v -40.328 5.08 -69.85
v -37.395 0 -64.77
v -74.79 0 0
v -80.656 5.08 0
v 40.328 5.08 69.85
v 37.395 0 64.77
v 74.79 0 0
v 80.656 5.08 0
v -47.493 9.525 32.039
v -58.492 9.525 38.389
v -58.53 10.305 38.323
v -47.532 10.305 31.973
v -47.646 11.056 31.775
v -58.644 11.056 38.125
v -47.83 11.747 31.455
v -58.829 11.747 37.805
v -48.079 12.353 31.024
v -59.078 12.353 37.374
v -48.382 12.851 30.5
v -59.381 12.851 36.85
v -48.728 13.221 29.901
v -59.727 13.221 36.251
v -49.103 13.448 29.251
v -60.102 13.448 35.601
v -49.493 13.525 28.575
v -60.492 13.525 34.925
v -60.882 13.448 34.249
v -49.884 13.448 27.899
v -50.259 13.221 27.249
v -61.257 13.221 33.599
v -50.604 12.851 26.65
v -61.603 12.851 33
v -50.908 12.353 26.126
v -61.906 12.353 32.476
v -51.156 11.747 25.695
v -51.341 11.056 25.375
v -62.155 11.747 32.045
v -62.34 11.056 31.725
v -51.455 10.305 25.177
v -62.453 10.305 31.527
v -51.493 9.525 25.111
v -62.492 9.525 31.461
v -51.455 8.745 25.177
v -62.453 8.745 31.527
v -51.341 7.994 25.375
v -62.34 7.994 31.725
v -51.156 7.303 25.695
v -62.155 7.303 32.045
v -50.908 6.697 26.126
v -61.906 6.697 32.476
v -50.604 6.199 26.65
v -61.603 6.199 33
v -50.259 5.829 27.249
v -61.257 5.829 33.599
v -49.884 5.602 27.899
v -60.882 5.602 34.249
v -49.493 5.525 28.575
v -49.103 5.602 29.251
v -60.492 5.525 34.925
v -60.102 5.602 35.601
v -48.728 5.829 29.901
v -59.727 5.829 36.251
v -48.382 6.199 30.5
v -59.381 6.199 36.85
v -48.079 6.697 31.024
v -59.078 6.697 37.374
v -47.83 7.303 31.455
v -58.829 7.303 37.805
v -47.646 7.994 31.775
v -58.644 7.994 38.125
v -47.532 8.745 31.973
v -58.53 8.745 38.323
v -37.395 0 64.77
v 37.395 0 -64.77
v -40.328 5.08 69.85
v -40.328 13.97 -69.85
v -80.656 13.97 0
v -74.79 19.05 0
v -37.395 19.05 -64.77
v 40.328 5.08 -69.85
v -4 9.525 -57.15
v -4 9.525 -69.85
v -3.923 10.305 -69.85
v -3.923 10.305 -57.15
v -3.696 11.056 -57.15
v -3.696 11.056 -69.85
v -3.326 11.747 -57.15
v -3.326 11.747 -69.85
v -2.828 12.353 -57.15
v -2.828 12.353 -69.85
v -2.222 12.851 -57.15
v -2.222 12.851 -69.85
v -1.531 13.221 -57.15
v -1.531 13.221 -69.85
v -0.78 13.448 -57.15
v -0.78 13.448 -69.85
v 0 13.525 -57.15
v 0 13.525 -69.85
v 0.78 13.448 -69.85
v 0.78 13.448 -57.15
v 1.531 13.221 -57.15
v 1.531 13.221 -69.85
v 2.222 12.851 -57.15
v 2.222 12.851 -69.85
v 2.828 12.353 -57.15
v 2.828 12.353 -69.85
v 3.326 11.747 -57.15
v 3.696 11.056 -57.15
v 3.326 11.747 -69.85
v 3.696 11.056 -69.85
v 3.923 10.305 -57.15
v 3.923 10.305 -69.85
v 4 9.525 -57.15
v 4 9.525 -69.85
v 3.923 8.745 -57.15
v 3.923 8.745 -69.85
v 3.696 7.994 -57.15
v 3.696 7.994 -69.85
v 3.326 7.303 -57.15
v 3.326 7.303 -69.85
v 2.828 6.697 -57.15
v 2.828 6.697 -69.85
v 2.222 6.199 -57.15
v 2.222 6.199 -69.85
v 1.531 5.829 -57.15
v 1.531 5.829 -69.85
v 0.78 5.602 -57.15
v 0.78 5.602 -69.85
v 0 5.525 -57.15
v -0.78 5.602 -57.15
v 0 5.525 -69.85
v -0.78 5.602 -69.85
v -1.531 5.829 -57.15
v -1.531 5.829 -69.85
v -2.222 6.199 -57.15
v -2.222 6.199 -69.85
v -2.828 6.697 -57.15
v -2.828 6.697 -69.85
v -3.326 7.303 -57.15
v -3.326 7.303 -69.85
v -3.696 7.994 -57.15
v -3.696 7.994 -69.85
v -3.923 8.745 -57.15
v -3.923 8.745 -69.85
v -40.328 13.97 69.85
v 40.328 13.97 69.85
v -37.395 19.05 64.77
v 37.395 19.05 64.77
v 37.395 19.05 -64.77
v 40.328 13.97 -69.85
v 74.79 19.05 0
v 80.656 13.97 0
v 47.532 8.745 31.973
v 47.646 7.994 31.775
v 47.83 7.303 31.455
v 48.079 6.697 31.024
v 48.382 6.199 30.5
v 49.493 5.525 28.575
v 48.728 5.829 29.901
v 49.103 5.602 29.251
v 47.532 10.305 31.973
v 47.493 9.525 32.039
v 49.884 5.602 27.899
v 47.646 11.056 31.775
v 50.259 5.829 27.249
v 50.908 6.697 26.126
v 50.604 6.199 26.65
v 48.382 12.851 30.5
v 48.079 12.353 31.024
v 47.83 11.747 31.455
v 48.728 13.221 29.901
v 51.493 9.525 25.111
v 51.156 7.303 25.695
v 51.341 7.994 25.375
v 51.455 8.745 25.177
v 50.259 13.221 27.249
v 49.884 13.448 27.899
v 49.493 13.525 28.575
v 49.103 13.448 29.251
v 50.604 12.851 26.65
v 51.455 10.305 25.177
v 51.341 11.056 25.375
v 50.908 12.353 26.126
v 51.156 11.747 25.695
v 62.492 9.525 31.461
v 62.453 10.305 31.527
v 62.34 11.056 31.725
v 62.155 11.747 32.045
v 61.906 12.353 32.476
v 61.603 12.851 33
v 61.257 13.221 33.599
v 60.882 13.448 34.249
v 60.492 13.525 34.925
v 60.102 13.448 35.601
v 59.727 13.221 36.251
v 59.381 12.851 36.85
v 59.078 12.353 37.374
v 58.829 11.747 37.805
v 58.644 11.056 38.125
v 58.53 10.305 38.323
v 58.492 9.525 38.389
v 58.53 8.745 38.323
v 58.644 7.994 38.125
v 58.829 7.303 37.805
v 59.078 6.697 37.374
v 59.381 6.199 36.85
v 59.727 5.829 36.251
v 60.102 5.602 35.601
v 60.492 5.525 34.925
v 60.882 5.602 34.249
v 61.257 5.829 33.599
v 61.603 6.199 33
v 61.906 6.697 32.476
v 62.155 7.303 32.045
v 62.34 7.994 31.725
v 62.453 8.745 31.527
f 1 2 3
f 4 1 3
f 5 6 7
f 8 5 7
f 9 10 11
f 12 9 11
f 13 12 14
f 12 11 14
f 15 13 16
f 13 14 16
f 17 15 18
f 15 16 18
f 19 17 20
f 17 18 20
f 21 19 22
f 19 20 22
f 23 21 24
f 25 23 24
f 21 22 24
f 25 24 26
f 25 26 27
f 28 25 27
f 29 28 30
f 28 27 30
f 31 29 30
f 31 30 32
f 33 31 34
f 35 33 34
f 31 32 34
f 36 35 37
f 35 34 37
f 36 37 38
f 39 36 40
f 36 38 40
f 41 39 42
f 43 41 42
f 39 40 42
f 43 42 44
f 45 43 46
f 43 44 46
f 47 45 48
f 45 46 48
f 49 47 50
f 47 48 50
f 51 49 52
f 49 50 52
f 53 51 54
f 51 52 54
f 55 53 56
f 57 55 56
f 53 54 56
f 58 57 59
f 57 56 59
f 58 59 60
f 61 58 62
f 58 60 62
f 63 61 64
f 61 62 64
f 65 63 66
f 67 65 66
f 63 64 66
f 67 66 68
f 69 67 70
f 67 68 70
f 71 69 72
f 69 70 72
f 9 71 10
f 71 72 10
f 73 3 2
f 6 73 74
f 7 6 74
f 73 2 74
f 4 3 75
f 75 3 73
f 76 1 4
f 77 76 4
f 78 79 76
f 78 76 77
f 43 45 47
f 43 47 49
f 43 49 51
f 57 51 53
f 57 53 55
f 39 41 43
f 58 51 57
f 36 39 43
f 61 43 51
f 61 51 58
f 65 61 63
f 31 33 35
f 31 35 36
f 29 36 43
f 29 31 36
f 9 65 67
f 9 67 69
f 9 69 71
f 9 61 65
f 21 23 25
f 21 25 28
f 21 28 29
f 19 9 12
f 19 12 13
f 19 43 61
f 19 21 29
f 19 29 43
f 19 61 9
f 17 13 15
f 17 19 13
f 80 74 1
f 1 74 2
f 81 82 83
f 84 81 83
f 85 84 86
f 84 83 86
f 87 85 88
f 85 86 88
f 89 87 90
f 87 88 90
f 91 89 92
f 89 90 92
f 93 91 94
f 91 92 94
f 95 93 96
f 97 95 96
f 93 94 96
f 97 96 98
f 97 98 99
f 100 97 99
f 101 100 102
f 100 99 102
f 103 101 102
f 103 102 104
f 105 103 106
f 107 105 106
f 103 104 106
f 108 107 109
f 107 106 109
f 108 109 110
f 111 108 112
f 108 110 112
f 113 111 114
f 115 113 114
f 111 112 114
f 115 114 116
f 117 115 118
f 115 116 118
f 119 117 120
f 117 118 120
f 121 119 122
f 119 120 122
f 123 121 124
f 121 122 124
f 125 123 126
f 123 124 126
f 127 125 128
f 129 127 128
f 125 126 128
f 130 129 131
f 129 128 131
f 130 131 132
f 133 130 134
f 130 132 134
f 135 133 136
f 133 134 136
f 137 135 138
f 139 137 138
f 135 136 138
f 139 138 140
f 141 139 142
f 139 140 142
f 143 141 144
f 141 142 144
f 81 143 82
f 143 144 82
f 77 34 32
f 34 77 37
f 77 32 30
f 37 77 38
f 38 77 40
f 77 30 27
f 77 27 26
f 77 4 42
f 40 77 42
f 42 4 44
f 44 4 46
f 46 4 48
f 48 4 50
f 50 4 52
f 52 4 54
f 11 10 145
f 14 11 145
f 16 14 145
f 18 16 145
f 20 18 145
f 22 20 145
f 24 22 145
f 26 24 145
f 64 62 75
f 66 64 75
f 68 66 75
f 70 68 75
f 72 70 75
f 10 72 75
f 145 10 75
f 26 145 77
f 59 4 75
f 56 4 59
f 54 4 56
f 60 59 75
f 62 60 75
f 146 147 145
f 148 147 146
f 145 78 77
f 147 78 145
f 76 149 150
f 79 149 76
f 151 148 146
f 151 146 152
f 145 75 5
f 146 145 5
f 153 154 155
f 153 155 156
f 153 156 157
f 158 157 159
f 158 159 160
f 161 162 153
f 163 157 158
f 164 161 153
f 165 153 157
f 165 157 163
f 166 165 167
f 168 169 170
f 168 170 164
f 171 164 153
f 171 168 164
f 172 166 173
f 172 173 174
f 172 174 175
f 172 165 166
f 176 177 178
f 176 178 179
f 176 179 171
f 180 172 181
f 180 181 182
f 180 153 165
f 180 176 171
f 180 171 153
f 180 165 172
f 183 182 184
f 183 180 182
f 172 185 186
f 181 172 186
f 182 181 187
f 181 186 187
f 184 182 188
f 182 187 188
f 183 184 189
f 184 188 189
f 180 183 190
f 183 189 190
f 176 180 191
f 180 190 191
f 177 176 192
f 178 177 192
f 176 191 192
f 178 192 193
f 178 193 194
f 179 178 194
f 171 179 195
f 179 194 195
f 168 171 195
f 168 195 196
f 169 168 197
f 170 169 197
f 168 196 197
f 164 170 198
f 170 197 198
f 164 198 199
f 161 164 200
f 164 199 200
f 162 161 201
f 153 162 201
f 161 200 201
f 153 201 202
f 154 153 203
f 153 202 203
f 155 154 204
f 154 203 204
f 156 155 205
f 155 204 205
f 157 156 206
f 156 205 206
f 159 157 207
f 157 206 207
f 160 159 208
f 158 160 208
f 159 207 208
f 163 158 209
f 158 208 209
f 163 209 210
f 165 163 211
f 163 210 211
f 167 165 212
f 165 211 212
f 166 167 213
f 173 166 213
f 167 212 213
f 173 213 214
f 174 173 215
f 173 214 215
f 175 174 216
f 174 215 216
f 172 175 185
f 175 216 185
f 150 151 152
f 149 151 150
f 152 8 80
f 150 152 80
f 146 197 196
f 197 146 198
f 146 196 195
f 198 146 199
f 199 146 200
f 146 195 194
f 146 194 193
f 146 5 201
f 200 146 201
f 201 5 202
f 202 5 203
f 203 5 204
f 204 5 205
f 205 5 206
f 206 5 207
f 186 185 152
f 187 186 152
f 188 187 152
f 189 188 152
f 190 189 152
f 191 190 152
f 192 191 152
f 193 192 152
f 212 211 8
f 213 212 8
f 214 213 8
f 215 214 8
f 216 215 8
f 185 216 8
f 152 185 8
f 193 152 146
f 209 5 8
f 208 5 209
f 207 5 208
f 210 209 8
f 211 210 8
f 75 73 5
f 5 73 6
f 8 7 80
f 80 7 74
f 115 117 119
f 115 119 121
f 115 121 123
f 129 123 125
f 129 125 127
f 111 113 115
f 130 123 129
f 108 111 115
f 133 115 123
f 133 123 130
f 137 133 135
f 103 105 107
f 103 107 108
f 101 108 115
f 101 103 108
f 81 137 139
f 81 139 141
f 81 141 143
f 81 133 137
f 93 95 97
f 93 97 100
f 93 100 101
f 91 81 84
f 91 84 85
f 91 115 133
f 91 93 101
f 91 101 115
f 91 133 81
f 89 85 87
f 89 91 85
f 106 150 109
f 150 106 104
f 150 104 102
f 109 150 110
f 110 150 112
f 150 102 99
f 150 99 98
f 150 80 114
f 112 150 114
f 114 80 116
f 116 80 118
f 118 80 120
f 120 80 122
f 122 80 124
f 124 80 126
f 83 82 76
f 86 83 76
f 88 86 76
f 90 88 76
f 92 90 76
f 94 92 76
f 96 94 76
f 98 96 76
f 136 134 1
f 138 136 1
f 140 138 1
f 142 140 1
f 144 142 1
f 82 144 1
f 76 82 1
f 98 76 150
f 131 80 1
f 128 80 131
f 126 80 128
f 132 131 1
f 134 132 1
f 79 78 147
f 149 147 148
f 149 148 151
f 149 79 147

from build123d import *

# Parameters (mm, degrees)
BOSS_EXTRUDE1_DEPTH = 19.05
CHAMFER1_SIZE       = 5.08
SKETCH2_R           = 4
CUT_EXTRUDE1_DEPTH  = 12.7
CIRPATTERN1_COUNT   = 3


with BuildPart() as part:
    # Sketch1 → Boss-Extrude1 (new body)
    with BuildSketch(Plane(origin=(0, 0, 0), x_dir=(1, 0, 0), z_dir=(0, 1, 0))):
        Polygon((40.327916303, -69.85), (80.655832606, 0), (40.327916303, 69.85), (-40.327916303, 69.85), (-80.655832606, 0), (-40.327916303, -69.85), align=None)
    extrude(amount=BOSS_EXTRUDE1_DEPTH)

    # Chamfer1
    chamfer1_edges = [part.edges().sort_by_distance(p)[0] for p in [
        (60.491874454, 19.05, -34.925),
        (0, 19.05, -69.85),
        (-60.491874454, 19.05, -34.925),
        (-60.491874454, 19.05, 34.925),
        (0, 19.05, 69.85),
        (-60.491874454, 0, 34.925),
        (-60.491874454, 0, -34.925),
        (0, 0, -69.85),
        (60.491874454, 0, -34.925),
        (60.491874454, 0, 34.925),
        (0, 0, 69.85),
        (60.491874454, 19.05, 34.925),
    ]]
    chamfer(chamfer1_edges, length=CHAMFER1_SIZE)

    # Sketch2 → Cut-Extrude1 (cut)
    with BuildSketch(Plane(origin=(-60.491874454, 0, 34.925), x_dir=(0.5000000000000001, 0, 0.8660254037844386), z_dir=(-0.8660254037844386, 0, 0.5000000000000001))):
        with Locations((0, 9.525)):
            Circle(SKETCH2_R)
    cut_extrude1 = extrude(amount=-CUT_EXTRUDE1_DEPTH, mode=Mode.SUBTRACT)

    # CirPattern1: Cut-Extrude1 ×3 about axis
    cirpattern1_axis = Axis((0, 0, 0), (0, 1, 0))
    for i in range(1, CIRPATTERN1_COUNT):
        add(cut_extrude1.rotate(cirpattern1_axis, i * 360 / CIRPATTERN1_COUNT), mode=Mode.SUBTRACT)


solid = part.part
